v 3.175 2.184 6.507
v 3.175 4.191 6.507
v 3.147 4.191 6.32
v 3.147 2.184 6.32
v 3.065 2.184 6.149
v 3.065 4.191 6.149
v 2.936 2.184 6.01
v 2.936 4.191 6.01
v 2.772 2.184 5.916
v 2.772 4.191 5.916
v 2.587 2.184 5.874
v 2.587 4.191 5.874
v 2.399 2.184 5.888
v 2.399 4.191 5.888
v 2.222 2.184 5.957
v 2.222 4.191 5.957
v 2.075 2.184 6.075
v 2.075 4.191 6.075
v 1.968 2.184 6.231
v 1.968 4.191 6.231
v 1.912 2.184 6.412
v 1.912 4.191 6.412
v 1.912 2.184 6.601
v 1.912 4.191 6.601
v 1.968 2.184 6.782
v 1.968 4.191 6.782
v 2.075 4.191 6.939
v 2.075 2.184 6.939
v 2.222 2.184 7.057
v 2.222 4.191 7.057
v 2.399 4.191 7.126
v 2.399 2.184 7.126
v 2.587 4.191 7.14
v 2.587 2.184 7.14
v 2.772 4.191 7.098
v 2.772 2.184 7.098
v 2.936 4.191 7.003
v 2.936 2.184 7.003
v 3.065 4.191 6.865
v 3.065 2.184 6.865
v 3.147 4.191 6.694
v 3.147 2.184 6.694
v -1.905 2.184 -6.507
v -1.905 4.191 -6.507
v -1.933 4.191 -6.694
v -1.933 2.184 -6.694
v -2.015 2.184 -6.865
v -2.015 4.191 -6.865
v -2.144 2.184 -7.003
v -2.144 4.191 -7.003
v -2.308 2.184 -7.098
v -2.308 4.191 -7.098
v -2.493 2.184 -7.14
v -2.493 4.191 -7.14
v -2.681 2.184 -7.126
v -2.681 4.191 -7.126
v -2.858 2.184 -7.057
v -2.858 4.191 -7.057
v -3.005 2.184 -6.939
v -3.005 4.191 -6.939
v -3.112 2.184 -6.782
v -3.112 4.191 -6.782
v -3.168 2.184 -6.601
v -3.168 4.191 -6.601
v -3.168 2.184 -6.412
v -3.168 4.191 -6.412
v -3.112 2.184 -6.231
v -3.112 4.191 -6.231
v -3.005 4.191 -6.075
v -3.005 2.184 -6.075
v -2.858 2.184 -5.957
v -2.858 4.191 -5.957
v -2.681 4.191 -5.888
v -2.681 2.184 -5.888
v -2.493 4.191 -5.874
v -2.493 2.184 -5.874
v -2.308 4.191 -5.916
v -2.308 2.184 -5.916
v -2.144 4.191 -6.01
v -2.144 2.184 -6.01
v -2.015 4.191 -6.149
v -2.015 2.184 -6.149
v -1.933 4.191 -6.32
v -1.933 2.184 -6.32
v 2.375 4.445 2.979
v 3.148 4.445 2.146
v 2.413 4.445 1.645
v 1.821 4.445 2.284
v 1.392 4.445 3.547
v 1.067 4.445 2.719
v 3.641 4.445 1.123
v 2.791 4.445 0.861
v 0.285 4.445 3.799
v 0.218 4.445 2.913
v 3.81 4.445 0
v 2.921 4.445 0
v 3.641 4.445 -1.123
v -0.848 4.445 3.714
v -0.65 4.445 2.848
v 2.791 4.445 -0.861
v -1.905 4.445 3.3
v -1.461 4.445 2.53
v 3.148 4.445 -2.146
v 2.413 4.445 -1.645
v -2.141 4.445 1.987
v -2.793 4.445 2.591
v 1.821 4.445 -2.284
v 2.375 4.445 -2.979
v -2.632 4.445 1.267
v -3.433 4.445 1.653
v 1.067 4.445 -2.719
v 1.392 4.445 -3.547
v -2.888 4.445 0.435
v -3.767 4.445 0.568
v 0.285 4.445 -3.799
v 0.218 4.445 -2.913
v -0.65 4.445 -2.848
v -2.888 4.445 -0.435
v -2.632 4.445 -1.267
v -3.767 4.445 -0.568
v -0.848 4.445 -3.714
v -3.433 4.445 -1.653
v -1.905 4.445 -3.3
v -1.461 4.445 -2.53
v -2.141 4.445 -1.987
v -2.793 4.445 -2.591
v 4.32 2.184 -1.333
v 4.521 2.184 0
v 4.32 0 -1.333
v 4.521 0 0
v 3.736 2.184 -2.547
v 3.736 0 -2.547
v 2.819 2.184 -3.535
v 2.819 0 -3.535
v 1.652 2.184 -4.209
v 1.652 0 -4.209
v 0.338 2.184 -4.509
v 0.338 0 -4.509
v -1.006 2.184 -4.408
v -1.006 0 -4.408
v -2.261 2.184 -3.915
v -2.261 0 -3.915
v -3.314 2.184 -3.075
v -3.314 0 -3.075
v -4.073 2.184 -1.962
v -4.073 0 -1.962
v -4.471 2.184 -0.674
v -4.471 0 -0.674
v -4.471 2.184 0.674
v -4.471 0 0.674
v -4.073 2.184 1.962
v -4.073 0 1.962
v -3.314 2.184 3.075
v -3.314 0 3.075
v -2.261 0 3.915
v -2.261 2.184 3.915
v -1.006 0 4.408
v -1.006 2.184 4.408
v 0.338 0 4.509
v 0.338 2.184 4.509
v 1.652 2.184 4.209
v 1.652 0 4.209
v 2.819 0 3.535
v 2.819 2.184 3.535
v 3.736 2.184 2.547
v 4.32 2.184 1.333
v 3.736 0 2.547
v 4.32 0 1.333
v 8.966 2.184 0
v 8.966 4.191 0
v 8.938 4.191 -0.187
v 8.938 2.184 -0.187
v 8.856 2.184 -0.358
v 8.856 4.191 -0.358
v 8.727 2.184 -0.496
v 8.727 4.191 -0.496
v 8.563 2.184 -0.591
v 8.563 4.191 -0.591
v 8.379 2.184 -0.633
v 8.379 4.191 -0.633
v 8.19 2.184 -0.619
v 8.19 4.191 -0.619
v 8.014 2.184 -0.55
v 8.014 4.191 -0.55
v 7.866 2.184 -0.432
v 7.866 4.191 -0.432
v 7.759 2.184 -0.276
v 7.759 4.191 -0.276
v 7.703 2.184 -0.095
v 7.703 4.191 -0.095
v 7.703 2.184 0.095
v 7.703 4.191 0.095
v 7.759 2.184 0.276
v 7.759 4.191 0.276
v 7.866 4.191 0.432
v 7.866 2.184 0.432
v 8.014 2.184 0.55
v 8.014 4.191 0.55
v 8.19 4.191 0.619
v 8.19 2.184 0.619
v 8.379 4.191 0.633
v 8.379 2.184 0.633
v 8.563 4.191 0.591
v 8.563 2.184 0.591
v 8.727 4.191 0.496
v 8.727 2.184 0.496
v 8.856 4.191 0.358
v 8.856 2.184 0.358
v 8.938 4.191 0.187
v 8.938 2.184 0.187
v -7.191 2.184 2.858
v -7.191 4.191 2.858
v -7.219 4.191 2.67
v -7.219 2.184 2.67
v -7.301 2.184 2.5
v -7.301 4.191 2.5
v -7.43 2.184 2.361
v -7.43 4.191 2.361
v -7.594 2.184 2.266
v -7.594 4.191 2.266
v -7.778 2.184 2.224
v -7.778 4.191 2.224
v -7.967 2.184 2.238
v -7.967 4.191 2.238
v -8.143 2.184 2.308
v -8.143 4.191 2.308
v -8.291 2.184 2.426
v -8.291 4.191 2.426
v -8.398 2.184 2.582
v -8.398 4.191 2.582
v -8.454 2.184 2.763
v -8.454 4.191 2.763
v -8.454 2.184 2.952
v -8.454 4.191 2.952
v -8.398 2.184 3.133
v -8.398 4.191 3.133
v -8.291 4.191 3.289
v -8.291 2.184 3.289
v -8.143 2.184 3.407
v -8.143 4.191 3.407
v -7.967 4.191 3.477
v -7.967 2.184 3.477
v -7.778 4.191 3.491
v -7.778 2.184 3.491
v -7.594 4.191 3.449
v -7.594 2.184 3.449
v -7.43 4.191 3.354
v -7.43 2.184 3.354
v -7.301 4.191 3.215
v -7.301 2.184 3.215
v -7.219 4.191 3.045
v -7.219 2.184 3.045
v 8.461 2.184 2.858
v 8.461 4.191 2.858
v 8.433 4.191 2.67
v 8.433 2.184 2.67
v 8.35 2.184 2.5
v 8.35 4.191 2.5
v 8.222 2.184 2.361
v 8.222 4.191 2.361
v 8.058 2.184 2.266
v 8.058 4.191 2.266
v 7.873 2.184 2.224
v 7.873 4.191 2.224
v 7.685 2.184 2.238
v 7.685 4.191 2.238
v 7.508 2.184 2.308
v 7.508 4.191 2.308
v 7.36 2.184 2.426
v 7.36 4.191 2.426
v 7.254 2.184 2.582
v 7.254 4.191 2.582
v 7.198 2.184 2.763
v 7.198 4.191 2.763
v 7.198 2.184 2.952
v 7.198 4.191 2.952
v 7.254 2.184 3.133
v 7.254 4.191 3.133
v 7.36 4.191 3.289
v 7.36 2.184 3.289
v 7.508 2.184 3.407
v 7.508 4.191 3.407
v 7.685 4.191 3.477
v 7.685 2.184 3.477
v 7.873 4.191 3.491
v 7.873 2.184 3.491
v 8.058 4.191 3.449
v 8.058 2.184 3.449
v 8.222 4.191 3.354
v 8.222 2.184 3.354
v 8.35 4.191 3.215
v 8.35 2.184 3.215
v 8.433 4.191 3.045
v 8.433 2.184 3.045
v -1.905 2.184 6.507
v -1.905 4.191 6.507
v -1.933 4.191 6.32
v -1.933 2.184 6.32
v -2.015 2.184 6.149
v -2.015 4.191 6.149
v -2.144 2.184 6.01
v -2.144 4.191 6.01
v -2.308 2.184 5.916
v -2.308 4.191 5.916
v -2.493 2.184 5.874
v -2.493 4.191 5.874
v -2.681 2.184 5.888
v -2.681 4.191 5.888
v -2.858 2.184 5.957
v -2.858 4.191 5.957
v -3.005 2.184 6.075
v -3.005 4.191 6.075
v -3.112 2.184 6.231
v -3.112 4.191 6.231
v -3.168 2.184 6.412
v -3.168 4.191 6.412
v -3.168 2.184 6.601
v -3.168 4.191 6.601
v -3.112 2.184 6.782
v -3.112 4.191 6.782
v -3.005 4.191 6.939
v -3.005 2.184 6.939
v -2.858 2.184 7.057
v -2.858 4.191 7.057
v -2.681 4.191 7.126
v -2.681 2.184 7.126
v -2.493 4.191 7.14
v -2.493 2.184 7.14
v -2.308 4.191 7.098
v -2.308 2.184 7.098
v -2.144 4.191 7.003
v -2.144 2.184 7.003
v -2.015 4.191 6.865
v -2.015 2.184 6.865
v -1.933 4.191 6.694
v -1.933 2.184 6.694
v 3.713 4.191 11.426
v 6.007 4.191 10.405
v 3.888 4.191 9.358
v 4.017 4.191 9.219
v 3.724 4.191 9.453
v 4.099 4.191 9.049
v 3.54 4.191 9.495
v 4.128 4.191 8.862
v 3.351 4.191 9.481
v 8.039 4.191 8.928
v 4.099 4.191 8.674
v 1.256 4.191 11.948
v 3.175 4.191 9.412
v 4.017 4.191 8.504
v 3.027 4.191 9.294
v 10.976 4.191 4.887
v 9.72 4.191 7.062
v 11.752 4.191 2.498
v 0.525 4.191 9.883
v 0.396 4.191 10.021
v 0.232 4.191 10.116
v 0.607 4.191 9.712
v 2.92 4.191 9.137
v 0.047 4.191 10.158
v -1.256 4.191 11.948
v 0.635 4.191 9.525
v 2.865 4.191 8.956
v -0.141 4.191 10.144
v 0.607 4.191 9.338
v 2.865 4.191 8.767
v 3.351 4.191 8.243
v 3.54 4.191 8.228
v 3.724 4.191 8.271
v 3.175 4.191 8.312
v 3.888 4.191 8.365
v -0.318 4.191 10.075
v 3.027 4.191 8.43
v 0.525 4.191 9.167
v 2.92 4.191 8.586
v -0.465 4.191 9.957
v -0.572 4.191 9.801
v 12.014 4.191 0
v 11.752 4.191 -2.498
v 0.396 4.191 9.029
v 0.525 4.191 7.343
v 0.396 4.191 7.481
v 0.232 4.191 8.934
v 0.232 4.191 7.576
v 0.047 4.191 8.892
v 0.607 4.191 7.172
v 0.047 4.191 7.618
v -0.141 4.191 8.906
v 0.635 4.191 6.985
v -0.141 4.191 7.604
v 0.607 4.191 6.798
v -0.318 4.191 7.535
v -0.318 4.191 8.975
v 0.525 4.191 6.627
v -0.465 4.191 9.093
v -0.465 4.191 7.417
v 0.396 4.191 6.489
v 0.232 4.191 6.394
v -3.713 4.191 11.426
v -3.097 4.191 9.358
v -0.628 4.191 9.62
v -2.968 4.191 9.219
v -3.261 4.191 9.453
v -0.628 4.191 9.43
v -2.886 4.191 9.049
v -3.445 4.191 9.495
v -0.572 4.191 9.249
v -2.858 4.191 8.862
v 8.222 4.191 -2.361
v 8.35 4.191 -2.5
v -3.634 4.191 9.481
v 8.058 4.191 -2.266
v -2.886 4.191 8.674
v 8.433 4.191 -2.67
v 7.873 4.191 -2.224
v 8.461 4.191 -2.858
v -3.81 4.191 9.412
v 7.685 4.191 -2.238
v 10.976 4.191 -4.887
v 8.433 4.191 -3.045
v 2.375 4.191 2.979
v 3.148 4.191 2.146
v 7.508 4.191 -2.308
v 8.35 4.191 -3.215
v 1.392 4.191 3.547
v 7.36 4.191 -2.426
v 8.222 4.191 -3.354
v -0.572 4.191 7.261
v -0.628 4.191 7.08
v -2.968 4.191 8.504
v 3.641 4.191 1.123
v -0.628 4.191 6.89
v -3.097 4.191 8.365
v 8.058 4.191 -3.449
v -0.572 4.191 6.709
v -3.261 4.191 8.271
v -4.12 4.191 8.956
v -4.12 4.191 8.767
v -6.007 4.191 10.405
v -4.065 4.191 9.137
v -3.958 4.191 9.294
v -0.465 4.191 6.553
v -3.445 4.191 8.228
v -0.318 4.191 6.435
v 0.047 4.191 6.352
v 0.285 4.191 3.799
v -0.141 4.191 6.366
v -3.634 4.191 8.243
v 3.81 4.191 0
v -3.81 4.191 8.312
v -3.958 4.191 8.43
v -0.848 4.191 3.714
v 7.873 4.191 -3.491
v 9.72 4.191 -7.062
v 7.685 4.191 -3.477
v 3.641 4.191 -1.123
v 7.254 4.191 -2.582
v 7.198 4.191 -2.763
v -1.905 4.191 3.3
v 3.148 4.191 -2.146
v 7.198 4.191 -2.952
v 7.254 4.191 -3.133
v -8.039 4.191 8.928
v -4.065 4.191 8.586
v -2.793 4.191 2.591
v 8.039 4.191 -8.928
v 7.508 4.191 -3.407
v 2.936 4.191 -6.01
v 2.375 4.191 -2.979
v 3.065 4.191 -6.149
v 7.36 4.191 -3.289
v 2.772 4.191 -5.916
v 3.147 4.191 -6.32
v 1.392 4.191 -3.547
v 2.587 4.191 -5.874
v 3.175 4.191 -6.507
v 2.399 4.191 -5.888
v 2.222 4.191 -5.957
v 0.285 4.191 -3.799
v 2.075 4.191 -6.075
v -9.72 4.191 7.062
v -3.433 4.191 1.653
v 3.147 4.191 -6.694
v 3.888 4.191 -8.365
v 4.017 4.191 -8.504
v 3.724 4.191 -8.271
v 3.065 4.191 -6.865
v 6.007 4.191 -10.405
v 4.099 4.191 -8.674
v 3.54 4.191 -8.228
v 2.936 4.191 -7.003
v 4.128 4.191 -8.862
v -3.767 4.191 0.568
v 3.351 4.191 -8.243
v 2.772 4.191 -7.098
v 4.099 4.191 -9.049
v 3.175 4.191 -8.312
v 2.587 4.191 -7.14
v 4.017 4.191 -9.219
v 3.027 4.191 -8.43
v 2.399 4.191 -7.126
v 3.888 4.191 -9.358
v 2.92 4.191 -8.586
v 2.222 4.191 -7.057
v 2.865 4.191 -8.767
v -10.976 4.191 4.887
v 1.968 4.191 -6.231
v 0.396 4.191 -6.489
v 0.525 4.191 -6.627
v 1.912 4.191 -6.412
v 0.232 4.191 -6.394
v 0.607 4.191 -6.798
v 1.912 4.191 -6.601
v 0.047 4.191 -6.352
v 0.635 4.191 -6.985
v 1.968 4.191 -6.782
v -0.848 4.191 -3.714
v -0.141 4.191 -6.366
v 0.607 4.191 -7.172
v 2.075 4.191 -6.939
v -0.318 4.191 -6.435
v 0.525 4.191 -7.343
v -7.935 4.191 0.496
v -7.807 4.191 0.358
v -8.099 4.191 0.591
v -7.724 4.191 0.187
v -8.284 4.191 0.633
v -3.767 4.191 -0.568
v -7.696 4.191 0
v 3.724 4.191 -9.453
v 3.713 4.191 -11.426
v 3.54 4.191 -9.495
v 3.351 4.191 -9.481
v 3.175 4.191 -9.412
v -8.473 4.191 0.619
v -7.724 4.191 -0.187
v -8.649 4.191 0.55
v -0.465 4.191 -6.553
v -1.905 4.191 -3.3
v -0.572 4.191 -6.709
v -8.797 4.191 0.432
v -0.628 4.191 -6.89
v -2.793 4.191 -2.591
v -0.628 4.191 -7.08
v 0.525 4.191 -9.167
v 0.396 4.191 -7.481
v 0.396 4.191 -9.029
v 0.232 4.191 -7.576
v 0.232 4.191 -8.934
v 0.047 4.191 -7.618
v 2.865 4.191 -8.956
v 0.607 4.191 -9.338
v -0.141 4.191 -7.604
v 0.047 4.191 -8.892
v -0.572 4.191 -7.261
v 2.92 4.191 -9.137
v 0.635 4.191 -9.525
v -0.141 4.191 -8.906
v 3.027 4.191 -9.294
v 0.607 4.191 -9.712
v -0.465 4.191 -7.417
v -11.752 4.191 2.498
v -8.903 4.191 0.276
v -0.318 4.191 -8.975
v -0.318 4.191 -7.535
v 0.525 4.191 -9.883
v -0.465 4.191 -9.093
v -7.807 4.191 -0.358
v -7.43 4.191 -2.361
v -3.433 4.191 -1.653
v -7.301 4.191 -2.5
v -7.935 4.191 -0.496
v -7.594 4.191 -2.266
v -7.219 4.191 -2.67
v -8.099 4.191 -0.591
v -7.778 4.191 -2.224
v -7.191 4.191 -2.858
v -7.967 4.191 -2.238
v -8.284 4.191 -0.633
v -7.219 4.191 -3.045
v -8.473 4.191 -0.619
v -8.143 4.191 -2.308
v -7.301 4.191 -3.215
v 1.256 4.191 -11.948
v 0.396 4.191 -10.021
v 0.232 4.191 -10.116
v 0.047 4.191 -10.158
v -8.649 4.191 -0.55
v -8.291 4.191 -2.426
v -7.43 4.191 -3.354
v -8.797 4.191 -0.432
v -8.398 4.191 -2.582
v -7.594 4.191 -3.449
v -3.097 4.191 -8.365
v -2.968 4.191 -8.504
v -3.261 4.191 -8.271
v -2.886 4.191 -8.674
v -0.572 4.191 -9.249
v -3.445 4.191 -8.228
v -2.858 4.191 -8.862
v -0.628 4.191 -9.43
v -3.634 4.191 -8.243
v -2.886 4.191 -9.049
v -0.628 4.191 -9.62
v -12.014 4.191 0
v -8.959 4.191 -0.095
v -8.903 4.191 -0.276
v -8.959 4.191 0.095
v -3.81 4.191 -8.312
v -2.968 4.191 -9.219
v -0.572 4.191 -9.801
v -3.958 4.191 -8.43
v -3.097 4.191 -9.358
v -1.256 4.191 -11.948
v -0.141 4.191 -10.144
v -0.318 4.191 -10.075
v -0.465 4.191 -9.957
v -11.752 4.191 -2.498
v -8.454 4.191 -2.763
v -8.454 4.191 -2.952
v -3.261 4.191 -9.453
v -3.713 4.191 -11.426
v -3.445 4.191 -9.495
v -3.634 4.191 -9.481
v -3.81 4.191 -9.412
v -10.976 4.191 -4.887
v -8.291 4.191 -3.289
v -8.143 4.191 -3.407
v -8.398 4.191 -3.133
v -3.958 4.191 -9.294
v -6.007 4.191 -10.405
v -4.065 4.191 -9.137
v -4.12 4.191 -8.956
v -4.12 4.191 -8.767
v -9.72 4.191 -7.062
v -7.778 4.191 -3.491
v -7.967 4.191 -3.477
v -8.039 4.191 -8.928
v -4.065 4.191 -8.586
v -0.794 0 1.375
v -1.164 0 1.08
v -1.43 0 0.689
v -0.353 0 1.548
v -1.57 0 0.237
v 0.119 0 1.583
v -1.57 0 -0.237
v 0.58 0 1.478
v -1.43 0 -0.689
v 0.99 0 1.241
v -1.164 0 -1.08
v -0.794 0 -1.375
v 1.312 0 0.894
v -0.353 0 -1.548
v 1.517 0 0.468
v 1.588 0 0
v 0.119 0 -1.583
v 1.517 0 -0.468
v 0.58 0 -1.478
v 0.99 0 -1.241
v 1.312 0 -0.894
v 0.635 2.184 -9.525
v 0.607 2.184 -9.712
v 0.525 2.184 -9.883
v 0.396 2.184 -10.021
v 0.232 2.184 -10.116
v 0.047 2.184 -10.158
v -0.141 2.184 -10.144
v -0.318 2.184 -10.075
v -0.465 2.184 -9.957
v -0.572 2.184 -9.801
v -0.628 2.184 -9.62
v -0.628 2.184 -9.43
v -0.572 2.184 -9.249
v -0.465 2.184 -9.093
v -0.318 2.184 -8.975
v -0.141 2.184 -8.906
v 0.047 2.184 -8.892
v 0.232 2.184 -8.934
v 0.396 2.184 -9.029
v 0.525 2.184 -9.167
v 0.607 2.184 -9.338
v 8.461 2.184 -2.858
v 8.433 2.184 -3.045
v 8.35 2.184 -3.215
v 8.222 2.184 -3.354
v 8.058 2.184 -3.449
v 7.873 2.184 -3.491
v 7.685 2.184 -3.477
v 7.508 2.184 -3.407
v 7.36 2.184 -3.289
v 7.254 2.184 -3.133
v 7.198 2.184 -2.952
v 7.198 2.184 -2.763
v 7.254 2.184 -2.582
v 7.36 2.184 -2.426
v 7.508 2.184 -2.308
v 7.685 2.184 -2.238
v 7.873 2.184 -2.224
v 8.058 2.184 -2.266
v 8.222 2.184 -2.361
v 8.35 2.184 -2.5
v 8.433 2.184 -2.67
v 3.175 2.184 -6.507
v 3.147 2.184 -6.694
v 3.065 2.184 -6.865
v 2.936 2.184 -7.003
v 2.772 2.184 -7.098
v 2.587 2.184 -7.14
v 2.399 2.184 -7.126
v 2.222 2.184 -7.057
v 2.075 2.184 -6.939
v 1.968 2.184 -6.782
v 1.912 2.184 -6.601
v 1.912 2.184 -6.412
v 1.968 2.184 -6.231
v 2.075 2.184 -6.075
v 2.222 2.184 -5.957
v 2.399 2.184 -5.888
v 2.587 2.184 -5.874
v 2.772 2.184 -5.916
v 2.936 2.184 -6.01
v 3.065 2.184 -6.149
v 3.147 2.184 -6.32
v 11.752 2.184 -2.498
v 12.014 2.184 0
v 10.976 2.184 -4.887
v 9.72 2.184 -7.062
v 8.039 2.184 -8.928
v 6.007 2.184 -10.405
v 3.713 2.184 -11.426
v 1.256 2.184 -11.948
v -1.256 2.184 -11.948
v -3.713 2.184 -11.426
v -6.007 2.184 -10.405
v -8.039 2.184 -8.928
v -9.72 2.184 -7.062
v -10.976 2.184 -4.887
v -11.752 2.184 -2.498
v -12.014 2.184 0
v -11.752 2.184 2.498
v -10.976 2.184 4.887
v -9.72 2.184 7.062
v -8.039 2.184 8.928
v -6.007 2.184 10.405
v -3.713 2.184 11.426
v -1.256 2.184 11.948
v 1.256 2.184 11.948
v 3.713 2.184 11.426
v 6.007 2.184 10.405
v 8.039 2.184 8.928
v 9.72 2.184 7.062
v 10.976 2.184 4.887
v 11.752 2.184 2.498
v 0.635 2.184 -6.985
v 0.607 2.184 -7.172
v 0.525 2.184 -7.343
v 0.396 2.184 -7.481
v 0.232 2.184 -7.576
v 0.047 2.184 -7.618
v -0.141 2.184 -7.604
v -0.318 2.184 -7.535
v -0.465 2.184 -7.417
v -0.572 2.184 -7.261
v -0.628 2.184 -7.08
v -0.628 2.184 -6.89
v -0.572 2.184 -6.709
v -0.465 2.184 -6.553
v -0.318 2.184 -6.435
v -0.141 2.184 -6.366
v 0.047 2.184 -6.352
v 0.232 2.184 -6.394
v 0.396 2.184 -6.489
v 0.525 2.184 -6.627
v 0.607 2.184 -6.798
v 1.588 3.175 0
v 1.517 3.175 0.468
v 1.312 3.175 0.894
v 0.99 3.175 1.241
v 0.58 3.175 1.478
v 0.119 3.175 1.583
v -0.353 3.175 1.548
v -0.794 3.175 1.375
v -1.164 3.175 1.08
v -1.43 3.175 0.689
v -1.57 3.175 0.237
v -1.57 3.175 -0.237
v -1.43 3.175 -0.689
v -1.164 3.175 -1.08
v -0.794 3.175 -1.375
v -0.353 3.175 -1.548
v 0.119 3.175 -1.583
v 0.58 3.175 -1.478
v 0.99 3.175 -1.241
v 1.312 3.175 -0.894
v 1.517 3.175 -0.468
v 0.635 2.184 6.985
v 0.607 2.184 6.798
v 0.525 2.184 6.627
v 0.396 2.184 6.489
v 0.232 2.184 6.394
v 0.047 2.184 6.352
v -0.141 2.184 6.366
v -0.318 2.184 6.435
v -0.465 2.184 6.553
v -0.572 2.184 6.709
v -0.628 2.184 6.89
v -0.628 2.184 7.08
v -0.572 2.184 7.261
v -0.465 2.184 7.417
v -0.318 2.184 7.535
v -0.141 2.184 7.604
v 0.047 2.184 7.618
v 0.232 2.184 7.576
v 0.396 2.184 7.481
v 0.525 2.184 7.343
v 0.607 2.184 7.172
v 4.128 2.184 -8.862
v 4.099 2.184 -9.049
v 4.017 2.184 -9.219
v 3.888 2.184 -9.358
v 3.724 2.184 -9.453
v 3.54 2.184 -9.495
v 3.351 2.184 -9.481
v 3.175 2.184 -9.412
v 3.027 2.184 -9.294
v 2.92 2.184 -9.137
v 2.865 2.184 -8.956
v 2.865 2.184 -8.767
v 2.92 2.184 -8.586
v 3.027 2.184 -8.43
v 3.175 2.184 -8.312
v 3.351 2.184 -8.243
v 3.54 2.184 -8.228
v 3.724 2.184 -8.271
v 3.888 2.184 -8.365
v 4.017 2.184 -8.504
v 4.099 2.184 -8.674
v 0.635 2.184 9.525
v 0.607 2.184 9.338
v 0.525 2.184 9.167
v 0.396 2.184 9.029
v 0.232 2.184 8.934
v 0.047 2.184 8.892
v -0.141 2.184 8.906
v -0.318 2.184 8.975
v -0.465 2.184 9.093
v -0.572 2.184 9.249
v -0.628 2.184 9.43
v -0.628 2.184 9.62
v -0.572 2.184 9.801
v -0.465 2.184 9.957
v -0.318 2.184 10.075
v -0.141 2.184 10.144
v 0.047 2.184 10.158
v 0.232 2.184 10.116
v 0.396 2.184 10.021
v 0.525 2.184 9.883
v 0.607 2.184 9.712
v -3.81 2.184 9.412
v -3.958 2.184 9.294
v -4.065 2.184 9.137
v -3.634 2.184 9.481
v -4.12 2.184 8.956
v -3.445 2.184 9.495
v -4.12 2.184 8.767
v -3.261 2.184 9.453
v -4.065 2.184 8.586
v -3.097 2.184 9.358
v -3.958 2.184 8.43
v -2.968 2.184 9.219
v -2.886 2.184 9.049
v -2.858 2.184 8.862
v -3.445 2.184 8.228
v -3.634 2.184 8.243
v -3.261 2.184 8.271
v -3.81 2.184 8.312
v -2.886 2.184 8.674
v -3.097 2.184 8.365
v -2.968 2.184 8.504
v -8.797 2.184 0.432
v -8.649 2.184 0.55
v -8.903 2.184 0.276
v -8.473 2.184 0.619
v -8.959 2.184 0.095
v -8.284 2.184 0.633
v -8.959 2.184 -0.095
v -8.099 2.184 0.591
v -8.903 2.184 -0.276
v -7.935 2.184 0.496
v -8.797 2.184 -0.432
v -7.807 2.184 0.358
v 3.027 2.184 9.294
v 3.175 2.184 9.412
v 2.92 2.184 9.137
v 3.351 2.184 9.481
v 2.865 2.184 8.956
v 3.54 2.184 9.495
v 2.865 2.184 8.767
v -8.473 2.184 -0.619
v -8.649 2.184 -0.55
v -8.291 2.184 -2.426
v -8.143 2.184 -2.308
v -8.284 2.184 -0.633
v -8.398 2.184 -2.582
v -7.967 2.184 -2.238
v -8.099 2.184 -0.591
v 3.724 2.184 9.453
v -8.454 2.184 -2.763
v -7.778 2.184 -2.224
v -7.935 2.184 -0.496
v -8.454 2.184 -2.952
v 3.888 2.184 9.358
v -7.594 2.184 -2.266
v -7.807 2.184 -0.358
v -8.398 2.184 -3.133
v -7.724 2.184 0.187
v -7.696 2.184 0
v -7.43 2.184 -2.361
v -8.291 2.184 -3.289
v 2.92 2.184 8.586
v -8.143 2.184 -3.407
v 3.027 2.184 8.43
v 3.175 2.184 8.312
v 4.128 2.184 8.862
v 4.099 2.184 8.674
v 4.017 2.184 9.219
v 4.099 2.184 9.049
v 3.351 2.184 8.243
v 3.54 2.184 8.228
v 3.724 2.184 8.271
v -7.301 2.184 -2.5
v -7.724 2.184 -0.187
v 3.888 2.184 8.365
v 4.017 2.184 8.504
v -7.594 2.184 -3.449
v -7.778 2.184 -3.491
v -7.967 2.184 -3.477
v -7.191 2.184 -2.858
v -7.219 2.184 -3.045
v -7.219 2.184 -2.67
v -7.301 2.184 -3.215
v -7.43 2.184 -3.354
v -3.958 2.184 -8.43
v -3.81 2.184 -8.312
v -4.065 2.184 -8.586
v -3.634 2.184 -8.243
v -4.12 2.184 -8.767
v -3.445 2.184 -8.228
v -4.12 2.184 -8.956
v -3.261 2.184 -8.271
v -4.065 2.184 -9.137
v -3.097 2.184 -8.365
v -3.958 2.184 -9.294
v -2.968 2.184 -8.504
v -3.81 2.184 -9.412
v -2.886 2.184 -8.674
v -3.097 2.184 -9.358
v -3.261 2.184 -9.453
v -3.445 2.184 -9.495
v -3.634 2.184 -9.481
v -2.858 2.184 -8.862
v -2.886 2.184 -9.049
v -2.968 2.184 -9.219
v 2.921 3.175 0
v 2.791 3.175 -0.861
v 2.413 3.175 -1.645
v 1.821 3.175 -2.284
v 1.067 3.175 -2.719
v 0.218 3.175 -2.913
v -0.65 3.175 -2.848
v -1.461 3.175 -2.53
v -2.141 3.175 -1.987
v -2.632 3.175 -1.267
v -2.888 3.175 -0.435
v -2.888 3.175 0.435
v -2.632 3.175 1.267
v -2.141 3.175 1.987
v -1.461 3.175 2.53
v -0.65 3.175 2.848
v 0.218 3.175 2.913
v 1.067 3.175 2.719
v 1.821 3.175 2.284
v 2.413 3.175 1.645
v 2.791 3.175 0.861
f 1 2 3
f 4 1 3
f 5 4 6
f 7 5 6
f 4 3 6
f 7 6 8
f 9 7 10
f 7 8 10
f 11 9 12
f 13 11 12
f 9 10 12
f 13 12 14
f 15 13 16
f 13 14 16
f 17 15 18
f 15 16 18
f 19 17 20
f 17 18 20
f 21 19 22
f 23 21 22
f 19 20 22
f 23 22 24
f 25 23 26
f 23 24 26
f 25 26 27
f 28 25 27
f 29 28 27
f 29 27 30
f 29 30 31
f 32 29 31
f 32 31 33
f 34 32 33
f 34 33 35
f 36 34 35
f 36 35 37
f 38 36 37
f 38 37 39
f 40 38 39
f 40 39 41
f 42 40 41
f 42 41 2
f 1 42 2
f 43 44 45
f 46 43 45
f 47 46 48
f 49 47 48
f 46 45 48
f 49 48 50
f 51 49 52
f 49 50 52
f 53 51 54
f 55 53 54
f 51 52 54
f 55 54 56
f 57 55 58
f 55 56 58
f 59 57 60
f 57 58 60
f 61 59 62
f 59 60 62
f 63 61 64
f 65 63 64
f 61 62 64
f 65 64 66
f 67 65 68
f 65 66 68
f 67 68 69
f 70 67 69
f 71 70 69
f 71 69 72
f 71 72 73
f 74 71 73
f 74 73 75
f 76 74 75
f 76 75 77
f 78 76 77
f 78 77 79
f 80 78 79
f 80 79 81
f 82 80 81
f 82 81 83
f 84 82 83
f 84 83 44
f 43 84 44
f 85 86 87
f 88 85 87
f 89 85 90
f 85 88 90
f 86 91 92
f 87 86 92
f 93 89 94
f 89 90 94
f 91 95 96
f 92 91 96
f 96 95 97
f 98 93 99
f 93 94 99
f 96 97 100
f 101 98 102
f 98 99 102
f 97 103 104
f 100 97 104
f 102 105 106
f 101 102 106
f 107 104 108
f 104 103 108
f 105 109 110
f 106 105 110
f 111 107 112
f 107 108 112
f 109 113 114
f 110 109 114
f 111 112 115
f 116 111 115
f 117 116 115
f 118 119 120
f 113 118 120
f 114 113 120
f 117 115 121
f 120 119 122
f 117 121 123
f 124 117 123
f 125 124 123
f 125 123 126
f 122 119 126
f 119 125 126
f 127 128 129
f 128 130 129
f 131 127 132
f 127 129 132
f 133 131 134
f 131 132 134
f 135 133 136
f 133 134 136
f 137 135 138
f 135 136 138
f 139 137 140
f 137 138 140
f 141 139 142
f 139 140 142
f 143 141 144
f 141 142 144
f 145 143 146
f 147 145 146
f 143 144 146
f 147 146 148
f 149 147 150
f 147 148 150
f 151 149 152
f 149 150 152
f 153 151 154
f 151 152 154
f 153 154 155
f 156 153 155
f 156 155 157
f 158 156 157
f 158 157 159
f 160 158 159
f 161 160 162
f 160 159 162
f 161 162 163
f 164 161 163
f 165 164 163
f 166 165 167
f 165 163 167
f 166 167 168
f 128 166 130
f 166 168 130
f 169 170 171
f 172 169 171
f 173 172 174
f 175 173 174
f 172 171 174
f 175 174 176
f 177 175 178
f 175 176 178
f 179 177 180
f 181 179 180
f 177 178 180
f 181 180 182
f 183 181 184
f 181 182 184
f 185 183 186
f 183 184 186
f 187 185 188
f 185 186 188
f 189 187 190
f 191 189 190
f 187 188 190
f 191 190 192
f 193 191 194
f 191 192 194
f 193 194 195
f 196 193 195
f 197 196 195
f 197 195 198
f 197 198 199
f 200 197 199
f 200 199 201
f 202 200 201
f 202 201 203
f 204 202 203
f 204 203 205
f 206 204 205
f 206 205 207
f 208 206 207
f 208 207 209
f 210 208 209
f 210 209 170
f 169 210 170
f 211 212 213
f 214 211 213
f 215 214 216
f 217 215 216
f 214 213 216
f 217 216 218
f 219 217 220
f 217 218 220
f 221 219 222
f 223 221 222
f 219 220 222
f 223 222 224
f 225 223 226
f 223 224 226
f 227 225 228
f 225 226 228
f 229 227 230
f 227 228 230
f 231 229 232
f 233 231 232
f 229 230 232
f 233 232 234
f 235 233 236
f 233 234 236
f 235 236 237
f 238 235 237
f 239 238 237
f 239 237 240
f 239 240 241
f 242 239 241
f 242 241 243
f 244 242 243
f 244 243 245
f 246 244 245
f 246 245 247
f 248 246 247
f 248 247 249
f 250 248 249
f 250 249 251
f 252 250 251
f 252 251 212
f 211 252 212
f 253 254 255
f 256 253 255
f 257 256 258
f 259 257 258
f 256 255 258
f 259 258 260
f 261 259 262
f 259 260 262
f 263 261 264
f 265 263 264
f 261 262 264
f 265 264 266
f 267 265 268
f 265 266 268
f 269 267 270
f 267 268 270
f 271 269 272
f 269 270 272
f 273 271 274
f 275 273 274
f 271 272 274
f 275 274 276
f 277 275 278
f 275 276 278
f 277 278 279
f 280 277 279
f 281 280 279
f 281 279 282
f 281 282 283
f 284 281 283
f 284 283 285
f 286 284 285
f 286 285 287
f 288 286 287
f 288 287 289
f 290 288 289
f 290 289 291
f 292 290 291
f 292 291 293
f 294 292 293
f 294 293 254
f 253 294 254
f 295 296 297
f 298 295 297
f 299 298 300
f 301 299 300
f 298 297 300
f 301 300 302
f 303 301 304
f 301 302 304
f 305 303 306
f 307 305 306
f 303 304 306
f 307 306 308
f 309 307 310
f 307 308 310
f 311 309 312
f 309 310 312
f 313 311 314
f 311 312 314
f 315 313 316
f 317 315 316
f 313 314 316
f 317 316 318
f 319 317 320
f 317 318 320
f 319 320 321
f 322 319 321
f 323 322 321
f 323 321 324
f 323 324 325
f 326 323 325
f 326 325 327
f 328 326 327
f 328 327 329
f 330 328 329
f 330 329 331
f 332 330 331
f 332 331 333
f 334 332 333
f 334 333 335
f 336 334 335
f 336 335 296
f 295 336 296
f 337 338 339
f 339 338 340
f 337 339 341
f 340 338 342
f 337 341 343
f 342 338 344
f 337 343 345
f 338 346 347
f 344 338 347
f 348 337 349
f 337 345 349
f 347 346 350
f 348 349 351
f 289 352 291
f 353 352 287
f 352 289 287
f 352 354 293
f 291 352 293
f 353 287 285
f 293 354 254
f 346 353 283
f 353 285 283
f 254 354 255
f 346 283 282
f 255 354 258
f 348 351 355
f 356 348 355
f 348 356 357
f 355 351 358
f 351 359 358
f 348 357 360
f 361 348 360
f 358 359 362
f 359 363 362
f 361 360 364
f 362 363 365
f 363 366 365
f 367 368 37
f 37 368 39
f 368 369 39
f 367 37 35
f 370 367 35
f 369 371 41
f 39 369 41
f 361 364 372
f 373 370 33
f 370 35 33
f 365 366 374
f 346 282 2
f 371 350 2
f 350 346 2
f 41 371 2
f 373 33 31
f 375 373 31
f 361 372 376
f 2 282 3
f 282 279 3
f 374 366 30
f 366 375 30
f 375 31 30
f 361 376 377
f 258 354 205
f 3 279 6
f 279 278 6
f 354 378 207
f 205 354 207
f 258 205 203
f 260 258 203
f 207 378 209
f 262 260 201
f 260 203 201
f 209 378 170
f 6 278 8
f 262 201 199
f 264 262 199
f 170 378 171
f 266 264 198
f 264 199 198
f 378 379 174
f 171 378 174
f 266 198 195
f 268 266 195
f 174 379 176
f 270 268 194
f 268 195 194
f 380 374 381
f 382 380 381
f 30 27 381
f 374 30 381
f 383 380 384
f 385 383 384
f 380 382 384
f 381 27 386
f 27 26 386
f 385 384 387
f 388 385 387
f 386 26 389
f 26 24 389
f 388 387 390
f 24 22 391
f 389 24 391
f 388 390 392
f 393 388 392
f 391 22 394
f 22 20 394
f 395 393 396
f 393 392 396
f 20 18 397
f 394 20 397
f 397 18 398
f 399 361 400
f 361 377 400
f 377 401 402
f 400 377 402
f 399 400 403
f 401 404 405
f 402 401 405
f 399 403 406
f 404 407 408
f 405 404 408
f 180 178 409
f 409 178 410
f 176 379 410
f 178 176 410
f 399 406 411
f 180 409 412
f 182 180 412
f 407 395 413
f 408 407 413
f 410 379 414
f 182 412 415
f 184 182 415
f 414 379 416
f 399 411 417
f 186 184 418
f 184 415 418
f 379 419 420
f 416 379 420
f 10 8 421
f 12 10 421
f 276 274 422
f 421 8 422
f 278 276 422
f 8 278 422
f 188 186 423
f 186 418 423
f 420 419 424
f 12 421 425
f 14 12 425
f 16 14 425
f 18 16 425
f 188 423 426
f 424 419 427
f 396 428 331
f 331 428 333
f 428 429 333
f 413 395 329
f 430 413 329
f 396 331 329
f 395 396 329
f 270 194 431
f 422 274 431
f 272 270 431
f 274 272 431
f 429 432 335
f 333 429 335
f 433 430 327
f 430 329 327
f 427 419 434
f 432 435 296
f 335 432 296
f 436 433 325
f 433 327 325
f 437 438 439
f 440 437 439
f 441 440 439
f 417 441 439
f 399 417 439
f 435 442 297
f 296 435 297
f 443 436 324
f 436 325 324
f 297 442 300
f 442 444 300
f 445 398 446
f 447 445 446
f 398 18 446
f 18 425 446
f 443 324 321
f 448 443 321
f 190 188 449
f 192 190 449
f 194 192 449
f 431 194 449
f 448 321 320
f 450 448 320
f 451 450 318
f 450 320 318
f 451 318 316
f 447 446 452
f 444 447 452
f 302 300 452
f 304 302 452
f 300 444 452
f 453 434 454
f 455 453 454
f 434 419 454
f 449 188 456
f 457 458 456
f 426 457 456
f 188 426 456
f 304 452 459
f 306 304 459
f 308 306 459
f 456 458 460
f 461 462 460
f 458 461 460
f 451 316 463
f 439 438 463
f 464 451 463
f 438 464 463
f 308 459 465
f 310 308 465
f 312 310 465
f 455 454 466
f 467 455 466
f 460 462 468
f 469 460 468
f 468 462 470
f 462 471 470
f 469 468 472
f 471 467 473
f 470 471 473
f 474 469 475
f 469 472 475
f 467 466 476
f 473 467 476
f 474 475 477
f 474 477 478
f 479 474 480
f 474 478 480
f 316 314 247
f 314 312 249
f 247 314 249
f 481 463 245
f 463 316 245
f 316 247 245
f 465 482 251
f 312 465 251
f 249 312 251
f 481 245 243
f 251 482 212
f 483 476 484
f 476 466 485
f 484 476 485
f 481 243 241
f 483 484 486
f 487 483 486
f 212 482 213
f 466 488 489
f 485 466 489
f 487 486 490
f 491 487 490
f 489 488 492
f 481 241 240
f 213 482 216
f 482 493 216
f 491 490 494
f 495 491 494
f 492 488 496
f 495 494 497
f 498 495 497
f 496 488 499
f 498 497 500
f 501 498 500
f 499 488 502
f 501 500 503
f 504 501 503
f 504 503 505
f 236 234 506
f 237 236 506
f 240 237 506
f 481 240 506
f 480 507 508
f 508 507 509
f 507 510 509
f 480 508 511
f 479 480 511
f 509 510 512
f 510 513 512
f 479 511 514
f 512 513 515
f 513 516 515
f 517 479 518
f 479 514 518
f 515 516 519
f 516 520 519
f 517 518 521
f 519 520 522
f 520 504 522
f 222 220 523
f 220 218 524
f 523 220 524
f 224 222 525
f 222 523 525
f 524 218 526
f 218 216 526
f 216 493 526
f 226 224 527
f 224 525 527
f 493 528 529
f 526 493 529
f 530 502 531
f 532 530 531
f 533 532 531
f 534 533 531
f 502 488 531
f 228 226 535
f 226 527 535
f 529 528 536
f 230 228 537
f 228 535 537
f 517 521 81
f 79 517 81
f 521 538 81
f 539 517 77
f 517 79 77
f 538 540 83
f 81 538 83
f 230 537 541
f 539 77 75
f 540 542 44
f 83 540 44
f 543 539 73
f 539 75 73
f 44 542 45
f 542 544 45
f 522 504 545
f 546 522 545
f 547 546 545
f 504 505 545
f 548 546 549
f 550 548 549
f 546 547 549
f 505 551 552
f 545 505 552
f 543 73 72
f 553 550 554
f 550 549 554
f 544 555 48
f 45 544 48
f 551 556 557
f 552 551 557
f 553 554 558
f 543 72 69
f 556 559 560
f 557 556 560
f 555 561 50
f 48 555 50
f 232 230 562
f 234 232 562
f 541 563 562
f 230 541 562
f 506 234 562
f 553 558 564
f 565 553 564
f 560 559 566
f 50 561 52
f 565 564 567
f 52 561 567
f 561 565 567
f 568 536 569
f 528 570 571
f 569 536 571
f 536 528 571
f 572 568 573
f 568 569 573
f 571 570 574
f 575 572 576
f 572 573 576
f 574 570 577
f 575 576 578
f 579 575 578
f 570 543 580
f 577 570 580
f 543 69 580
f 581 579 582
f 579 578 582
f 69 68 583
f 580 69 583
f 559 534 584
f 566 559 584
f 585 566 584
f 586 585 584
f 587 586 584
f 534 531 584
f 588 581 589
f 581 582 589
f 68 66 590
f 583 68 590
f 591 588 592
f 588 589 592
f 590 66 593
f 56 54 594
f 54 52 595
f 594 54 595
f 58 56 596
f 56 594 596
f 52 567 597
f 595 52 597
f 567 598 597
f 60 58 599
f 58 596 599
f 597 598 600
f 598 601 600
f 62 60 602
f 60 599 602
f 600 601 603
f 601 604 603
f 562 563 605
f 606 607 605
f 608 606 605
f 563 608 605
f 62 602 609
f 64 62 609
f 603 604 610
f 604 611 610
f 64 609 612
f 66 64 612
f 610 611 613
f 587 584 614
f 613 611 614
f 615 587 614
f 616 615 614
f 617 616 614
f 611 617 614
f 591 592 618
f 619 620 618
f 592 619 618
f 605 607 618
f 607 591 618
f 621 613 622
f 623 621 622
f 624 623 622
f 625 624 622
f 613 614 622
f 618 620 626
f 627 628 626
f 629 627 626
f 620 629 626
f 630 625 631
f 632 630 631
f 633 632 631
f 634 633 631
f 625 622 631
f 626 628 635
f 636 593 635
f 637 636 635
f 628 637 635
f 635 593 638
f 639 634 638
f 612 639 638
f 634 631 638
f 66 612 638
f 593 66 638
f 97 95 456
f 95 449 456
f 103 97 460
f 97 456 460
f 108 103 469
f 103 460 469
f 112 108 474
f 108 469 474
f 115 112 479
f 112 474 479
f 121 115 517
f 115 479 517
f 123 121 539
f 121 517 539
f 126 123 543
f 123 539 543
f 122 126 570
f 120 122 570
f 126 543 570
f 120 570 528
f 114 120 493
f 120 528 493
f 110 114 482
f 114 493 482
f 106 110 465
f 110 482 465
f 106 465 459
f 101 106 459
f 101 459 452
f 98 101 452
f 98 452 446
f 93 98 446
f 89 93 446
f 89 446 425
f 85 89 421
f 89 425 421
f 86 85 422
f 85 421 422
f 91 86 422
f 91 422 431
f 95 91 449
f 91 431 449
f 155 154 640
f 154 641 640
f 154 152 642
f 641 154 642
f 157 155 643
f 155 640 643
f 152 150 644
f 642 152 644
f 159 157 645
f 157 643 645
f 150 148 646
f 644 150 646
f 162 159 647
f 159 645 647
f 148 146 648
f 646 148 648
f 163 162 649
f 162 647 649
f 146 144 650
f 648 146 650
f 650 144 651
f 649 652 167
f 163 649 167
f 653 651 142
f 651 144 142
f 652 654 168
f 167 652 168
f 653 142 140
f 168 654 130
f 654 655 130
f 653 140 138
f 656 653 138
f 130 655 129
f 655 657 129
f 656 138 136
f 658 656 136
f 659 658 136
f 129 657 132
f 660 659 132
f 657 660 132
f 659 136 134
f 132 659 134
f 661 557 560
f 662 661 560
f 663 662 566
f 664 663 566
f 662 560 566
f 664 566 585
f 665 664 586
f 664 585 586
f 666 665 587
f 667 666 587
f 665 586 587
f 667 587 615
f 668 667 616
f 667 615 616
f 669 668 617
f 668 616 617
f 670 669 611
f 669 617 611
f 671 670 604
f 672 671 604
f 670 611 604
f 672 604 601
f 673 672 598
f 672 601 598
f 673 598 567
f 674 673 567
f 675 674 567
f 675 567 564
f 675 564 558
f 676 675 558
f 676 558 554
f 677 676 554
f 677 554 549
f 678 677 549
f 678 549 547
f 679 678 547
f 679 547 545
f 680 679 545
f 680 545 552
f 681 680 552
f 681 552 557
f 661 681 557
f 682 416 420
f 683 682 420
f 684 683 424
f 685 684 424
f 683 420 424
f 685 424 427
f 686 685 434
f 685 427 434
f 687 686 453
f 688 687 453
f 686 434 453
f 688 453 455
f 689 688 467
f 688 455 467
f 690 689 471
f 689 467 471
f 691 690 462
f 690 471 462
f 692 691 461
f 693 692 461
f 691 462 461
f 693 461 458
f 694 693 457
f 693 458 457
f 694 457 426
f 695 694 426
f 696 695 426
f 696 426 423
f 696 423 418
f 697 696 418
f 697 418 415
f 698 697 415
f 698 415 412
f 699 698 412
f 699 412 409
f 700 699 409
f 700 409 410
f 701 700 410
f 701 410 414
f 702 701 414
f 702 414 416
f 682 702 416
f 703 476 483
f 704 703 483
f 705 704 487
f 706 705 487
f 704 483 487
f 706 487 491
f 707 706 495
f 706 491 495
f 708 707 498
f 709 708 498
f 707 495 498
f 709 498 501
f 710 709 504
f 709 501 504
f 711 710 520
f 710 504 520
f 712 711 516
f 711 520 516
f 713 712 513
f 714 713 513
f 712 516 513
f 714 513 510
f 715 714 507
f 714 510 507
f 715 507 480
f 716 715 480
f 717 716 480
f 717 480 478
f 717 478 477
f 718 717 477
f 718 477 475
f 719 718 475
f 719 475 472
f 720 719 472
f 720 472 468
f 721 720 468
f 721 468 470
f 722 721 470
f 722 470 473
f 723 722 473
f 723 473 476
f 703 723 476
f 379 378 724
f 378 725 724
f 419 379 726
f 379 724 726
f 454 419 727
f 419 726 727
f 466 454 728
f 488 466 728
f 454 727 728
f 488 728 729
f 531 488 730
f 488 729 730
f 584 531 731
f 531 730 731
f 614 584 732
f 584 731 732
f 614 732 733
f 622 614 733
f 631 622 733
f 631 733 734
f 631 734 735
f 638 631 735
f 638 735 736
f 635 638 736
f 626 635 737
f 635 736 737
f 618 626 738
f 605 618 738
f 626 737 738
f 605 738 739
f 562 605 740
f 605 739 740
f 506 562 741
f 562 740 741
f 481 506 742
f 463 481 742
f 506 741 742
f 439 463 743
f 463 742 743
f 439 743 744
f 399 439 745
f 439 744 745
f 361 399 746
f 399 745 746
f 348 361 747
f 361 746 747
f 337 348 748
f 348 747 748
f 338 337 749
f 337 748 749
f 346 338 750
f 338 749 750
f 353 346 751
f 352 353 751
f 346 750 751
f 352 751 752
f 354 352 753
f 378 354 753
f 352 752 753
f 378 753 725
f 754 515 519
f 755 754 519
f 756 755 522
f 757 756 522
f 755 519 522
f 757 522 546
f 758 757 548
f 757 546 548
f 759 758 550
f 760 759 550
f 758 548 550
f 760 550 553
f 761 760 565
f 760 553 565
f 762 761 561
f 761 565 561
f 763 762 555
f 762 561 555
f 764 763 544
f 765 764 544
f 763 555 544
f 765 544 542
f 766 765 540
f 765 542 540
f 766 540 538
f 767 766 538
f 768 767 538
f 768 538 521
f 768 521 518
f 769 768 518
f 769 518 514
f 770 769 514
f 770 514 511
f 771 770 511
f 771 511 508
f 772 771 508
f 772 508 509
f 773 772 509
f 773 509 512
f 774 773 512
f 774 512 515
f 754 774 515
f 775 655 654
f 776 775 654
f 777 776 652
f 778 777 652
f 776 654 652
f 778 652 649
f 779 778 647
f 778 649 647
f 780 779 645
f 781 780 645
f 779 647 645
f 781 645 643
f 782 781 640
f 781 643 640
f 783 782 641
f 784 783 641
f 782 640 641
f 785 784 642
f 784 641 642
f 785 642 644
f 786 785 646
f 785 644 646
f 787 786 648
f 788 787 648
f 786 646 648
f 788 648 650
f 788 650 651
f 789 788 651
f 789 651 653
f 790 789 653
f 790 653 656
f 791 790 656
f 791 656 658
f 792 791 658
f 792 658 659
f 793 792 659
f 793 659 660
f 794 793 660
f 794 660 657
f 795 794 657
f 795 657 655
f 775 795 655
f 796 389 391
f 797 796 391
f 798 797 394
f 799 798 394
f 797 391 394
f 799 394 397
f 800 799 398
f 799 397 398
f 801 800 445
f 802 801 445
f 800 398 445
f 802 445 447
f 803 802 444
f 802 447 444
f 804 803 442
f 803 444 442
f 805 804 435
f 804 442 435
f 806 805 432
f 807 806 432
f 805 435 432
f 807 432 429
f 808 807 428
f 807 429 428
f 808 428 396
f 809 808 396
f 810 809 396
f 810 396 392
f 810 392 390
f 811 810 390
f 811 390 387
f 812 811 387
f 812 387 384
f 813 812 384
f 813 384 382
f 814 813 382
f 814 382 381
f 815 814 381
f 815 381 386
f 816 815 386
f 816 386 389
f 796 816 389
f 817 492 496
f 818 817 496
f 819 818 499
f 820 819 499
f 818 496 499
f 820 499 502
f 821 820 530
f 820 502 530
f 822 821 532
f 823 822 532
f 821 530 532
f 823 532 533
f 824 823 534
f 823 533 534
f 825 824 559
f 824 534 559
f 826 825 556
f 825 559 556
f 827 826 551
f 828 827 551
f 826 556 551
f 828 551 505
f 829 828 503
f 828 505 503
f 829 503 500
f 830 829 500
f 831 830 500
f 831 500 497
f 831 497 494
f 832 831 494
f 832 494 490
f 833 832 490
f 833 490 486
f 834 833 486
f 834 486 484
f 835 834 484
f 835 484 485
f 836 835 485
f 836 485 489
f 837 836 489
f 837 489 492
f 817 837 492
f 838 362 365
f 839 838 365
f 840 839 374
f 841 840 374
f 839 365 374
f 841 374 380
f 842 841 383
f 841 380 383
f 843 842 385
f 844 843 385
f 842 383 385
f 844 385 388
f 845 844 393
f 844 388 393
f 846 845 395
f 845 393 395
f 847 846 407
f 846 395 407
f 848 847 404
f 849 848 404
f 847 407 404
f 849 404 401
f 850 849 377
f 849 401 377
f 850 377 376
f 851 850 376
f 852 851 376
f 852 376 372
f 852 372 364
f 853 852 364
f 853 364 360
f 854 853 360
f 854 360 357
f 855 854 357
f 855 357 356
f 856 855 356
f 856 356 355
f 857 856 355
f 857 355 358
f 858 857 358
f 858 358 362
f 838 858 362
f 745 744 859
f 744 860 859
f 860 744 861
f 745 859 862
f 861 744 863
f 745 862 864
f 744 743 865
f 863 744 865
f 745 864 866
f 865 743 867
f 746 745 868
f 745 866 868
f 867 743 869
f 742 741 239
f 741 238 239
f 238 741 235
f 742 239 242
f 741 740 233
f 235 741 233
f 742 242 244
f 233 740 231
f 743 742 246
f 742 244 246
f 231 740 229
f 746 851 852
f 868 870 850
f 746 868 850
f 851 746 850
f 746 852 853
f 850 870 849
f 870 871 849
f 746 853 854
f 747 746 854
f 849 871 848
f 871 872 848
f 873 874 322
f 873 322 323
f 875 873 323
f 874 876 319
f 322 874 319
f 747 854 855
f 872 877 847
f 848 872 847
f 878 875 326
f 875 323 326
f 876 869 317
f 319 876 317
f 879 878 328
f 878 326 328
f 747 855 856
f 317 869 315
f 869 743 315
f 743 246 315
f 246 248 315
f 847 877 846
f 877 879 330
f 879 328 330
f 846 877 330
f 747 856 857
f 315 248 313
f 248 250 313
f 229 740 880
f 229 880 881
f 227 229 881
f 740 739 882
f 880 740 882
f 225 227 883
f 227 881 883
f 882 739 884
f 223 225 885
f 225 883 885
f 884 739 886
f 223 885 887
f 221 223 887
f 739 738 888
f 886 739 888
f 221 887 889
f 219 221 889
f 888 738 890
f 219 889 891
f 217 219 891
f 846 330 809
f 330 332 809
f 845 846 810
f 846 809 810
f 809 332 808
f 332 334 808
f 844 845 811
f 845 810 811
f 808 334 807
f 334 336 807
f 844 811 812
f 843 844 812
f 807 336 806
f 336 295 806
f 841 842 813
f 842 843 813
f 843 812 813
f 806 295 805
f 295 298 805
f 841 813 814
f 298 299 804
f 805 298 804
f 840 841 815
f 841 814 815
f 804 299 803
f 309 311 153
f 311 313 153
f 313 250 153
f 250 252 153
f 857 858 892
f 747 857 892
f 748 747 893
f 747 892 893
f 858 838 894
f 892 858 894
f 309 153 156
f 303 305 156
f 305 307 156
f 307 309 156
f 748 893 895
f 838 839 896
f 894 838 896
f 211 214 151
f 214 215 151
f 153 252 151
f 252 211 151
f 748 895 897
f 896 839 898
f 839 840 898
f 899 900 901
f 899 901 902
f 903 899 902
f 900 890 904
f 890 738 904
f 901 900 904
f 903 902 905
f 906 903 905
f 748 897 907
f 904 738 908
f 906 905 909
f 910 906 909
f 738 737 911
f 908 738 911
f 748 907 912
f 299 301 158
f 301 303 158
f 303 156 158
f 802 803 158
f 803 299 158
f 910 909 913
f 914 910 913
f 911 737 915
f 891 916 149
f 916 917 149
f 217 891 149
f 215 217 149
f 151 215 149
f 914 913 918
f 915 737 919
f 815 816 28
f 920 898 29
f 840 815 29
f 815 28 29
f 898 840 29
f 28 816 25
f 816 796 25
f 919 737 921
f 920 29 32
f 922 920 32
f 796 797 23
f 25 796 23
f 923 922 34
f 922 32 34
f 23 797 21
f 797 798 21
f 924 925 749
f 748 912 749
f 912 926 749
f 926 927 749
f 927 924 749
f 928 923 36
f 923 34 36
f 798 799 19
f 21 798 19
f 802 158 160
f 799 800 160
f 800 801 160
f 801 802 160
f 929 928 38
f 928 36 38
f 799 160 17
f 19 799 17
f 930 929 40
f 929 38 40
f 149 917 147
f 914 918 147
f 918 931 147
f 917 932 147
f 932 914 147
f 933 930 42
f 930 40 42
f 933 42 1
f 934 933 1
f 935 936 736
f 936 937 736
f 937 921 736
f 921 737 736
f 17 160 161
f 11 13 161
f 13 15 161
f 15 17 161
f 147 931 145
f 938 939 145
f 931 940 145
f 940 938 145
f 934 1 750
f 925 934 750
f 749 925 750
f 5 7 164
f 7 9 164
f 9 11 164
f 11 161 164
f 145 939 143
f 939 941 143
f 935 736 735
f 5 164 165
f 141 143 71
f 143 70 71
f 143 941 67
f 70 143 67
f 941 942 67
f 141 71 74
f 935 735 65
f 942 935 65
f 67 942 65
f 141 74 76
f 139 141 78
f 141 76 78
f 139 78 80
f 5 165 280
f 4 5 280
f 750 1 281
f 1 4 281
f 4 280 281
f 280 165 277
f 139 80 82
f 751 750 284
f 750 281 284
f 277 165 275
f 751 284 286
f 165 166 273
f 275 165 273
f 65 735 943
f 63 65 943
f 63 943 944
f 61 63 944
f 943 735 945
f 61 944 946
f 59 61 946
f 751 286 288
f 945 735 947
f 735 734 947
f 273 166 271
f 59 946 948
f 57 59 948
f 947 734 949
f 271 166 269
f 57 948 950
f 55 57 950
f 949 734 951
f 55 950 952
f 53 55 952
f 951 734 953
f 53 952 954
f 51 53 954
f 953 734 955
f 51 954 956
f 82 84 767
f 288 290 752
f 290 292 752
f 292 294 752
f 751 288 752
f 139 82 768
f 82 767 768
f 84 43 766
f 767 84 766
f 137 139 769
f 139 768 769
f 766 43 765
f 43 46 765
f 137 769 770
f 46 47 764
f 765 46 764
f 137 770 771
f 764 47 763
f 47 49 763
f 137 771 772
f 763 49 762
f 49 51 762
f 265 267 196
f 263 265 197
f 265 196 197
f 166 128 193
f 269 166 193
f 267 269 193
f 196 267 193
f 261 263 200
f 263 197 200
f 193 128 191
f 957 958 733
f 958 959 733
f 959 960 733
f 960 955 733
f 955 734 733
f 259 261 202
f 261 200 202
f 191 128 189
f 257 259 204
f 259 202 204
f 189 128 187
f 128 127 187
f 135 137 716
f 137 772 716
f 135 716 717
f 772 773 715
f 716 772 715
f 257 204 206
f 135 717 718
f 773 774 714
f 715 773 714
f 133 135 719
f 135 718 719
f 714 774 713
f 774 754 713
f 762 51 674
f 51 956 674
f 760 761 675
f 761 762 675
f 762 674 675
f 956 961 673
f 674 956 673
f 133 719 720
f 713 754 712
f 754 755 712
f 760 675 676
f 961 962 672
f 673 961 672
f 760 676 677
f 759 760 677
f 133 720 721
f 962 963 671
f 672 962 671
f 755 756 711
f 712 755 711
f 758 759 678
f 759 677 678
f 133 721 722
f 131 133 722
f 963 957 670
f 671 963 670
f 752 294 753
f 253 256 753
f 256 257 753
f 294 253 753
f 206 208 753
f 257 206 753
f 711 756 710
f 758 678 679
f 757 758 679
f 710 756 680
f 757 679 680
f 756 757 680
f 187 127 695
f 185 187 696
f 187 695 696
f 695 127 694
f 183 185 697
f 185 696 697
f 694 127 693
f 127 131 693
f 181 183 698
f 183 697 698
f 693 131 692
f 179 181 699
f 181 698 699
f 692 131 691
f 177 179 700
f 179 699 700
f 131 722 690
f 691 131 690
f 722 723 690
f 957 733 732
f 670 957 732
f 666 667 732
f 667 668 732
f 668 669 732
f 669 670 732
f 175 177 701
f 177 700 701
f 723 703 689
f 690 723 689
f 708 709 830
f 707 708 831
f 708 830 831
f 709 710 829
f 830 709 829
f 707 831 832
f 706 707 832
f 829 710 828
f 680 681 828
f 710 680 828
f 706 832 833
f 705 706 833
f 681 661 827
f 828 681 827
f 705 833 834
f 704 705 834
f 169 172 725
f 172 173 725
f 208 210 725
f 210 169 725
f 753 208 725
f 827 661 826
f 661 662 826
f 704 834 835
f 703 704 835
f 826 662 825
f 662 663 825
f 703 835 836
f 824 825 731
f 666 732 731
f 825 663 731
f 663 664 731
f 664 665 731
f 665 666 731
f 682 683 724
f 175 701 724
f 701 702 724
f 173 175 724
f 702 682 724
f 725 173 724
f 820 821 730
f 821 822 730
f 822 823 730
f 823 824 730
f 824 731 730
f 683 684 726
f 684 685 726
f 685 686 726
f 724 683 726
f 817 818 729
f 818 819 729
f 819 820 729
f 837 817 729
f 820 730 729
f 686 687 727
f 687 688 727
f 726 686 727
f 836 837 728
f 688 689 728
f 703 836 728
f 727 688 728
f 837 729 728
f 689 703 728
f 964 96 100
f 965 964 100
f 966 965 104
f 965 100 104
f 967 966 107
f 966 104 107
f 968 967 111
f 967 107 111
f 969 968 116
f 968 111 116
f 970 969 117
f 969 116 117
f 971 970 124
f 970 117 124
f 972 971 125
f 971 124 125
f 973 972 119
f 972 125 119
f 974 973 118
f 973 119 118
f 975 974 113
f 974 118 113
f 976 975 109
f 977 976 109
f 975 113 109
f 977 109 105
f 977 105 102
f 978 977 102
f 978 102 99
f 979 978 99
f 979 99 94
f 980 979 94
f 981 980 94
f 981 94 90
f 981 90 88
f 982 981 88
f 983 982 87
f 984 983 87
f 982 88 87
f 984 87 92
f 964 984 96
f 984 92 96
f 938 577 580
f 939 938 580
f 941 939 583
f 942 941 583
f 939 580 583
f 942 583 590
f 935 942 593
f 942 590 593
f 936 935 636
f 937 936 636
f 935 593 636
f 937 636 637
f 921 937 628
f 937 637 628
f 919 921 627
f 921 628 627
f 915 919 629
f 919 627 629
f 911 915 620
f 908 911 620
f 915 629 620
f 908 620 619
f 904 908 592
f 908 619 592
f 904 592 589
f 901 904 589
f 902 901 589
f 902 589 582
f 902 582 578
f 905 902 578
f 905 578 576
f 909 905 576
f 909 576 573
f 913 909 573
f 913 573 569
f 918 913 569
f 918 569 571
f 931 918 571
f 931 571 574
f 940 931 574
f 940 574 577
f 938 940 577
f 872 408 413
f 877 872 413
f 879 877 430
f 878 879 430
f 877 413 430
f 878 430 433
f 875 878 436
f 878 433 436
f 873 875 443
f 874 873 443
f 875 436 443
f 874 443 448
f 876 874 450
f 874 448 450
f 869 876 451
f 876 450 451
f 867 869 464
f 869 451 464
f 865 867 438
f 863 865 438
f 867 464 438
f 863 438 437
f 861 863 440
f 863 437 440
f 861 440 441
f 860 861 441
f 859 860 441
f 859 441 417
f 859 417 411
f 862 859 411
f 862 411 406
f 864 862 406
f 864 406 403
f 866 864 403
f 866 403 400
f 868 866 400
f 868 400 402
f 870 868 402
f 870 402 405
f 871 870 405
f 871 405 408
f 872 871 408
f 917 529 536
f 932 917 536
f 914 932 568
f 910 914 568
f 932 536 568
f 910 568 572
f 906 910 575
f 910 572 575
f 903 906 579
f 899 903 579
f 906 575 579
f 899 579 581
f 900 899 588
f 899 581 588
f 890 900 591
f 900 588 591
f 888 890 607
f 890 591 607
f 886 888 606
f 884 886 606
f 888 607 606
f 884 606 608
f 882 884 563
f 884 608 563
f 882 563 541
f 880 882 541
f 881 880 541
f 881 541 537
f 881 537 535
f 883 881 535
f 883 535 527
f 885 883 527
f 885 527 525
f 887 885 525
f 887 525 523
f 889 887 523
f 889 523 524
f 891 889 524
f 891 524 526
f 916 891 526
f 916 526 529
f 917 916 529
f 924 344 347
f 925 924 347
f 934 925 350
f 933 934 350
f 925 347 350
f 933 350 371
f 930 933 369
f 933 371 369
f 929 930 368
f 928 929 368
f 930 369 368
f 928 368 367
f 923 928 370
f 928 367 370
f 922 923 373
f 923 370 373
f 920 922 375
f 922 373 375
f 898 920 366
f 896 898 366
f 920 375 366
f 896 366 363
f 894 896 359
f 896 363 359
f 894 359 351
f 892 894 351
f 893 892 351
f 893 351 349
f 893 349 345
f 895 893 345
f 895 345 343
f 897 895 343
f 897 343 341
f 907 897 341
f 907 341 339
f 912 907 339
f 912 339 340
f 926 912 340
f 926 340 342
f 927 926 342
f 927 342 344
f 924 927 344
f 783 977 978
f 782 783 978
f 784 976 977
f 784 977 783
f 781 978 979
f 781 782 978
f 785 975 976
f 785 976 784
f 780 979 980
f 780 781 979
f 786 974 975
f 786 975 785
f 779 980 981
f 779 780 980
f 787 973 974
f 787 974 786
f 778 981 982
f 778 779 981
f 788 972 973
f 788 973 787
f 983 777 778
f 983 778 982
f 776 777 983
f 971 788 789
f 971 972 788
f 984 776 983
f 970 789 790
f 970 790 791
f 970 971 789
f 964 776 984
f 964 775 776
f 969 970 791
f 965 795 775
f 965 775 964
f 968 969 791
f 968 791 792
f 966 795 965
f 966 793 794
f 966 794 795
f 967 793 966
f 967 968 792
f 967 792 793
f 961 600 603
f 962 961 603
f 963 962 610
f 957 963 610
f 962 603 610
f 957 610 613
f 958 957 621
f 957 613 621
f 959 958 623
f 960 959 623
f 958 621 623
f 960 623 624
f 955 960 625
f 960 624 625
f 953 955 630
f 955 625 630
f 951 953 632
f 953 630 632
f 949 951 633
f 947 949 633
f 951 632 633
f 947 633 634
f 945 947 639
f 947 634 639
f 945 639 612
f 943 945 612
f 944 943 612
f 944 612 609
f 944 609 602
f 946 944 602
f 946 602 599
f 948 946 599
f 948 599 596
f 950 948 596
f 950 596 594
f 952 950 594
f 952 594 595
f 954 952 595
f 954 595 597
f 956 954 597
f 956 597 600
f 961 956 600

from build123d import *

# Parameters (mm, degrees)
SKETCH2_R      = 2.921
EXTRUDE1_DEPTH = 1.27
SKETCH3_R      = 1.5875
EXTRUDE2_DEPTH = 5.445
SKETCH4_R      = 0.635
EXTRUDE3_DEPTH = 5.191
SKETCH5_R      = 0.635
EXTRUDE4_DEPTH = 5.191


with BuildPart() as part:
    # Sketch1 → Revolve1 (revolve)
    with BuildSketch(Plane.XY):
        Polygon((0, 0), (0, 4.445), (3.81, 4.445), (3.81, 4.191), (12.0142, 4.191), (12.0142, 2.1844), (4.5212, 2.1844), (4.5212, 0), align=None)
    revolve(axis=Axis((0, 0, 0), (0, 1, 0)))

    # Sketch2 → Extrude1 (cut)
    with BuildSketch(Plane(origin=(0, 4.445, 0), x_dir=(1, 0, 0), z_dir=(0, 1, 0))):
        Circle(SKETCH2_R)
    extrude(amount=-EXTRUDE1_DEPTH, mode=Mode.SUBTRACT)

    # Sketch3 → Extrude2 (cut, through all)
    with BuildSketch(Plane.XZ):
        Circle(SKETCH3_R)
    extrude(amount=-EXTRUDE2_DEPTH, mode=Mode.SUBTRACT)

    # Sketch4 → Extrude3 (cut, through all)
    with BuildSketch(Plane(origin=(0, 4.191, 0), x_dir=(1, 0, 0), z_dir=(0, 1, 0))):
        with Locations((0, 6.985)):
            Circle(SKETCH4_R)
        with Locations((-7.825828211, 2.8575)):
            Circle(SKETCH4_R)
        with Locations((-8.3312, 0)):
            Circle(SKETCH4_R)
        with Locations((-7.825828211, -2.8575)):
            Circle(SKETCH4_R)
        with Locations((7.825828211, 2.8575)):
            Circle(SKETCH4_R)
        with Locations((8.3312, 0)):
            Circle(SKETCH4_R)
        with Locations((7.825828211, -2.8575)):
            Circle(SKETCH4_R)
        with Locations((2.54, 6.506813736)):
            Circle(SKETCH4_R)
        with Locations((-2.54, 6.506813736)):
            Circle(SKETCH4_R)
        with Locations((2.54, -6.506813736)):
            Circle(SKETCH4_R)
        with Locations((0, -6.985)):
            Circle(SKETCH4_R)
        with Locations((-2.54, -6.506813736)):
            Circle(SKETCH4_R)
    extrude(amount=-EXTRUDE3_DEPTH, mode=Mode.SUBTRACT)

    # Sketch5 → Extrude4 (cut, through all)
    with BuildSketch(Plane(origin=(0, 4.191, 0), x_dir=(1, 0, 0), z_dir=(0, 1, 0))):
        with Locations((0, 9.525)):
            Circle(SKETCH5_R)
        with Locations((3.4925, 8.861606443)):
            Circle(SKETCH5_R)
        with Locations((-3.4925, 8.861606443)):
            Circle(SKETCH5_R)
        with Locations((3.4925, -8.861606443)):
            Circle(SKETCH5_R)
        with Locations((0, -9.525)):
            Circle(SKETCH5_R)
        with Locations((-3.4925, -8.861606443)):
            Circle(SKETCH5_R)
    extrude(amount=-EXTRUDE4_DEPTH, mode=Mode.SUBTRACT)


solid = part.part
